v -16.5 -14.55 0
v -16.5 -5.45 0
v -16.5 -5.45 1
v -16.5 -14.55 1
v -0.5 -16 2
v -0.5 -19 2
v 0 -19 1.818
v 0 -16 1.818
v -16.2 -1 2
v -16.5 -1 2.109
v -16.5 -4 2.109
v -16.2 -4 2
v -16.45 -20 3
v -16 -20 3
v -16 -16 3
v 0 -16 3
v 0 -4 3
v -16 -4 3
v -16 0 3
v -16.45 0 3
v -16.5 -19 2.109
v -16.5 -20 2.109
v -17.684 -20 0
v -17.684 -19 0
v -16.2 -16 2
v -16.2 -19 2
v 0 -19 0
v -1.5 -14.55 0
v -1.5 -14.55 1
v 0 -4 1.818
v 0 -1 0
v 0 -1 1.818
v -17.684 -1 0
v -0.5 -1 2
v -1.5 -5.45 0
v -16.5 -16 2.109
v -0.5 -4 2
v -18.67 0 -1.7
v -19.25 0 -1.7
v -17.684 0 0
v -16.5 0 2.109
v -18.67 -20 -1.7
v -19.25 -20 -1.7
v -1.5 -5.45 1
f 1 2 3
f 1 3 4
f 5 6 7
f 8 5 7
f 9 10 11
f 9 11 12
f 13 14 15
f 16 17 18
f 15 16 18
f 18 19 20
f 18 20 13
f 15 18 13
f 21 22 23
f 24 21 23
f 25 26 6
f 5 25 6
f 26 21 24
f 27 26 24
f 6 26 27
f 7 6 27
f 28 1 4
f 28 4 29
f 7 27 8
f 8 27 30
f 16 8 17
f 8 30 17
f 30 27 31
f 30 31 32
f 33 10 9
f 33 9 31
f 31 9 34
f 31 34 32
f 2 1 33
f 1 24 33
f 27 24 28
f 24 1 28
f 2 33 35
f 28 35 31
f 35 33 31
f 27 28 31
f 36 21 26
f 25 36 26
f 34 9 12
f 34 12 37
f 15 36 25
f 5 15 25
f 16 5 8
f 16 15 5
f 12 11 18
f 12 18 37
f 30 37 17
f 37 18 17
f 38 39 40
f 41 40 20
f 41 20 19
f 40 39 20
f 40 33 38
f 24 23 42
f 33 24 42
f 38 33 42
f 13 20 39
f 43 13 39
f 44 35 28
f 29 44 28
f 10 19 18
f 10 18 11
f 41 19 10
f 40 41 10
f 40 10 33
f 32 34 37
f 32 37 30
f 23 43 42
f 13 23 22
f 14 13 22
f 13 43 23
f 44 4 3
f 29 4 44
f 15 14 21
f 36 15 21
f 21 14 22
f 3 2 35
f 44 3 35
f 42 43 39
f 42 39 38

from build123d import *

# Parameters (mm, degrees)
F1_DEPTH  = 20
F3_DEPTH  = 4
F5_DEPTH  = 1
F7_DEPTH  = 20.001
F10_W     = 15
F10_H     = 9.1
F11_DEPTH = 1


# Not quite as in the source:
# - a pattern or mirror of a feature is missing from the dataset's text; its kind, count and spacing are read off the source's solid


with BuildPart() as f1:
    # F0 (on Front) → F1 (new body)
    with BuildSketch(Plane.XZ):
        Polygon((-16.45, 3), (-19.25, -1.7), (-18.09, -1.7), (-17.0772340426, 0), (0, 0), (0, 3), align=None)
    extrude(amount=F1_DEPTH)

    # F2 (on face) → F3 (cut)
    with BuildSketch(Plane.XZ.offset(20)):
        Polygon((-16.2, 2), (-0.5, 2), (0, 1.8180148829), (0, 3), (-16, 3), (-16.5, 2.1091910703), align=None)
    f3 = extrude(amount=-F3_DEPTH, mode=Mode.SUBTRACT)

    # F3_copies: F3 across plane
    add(f3.mirror(Plane.ZX.offset(-10)), mode=Mode.SUBTRACT)

    # F4 (on face) → F5 (cut)
    with BuildSketch(Plane.XZ.offset(20)):
        Polygon((0, 0), (0, 1.8180148829), (-0.5, 2), (-16.2, 2), (-16.5, 2.1091910703), (-17.683862779, 0), align=None)
    f5 = extrude(amount=-F5_DEPTH, mode=Mode.SUBTRACT)

    # F5_copies: F5 across plane
    add(f5.mirror(Plane.ZX.offset(-10)), mode=Mode.SUBTRACT)

    # F6 (on face) → F7 (cut, through all)
    with BuildSketch(Plane.XZ.offset(20)):
        Polygon((-18.67, -1.7), (-18.09, -1.7), (-17.0772340426, 0), (-17.683862779, 0), align=None)
    extrude(amount=-F7_DEPTH, mode=Mode.SUBTRACT)

    # F10 (on face) → F11 (cut)
    with BuildSketch(Plane(origin=(0, 0, 0), x_dir=(1, 0, 0), z_dir=(0, 0, -1))):
        with Locations((-9, 10)):
            Rectangle(F10_W, F10_H)
    extrude(amount=-F11_DEPTH, mode=Mode.SUBTRACT)


solid = f1.part
